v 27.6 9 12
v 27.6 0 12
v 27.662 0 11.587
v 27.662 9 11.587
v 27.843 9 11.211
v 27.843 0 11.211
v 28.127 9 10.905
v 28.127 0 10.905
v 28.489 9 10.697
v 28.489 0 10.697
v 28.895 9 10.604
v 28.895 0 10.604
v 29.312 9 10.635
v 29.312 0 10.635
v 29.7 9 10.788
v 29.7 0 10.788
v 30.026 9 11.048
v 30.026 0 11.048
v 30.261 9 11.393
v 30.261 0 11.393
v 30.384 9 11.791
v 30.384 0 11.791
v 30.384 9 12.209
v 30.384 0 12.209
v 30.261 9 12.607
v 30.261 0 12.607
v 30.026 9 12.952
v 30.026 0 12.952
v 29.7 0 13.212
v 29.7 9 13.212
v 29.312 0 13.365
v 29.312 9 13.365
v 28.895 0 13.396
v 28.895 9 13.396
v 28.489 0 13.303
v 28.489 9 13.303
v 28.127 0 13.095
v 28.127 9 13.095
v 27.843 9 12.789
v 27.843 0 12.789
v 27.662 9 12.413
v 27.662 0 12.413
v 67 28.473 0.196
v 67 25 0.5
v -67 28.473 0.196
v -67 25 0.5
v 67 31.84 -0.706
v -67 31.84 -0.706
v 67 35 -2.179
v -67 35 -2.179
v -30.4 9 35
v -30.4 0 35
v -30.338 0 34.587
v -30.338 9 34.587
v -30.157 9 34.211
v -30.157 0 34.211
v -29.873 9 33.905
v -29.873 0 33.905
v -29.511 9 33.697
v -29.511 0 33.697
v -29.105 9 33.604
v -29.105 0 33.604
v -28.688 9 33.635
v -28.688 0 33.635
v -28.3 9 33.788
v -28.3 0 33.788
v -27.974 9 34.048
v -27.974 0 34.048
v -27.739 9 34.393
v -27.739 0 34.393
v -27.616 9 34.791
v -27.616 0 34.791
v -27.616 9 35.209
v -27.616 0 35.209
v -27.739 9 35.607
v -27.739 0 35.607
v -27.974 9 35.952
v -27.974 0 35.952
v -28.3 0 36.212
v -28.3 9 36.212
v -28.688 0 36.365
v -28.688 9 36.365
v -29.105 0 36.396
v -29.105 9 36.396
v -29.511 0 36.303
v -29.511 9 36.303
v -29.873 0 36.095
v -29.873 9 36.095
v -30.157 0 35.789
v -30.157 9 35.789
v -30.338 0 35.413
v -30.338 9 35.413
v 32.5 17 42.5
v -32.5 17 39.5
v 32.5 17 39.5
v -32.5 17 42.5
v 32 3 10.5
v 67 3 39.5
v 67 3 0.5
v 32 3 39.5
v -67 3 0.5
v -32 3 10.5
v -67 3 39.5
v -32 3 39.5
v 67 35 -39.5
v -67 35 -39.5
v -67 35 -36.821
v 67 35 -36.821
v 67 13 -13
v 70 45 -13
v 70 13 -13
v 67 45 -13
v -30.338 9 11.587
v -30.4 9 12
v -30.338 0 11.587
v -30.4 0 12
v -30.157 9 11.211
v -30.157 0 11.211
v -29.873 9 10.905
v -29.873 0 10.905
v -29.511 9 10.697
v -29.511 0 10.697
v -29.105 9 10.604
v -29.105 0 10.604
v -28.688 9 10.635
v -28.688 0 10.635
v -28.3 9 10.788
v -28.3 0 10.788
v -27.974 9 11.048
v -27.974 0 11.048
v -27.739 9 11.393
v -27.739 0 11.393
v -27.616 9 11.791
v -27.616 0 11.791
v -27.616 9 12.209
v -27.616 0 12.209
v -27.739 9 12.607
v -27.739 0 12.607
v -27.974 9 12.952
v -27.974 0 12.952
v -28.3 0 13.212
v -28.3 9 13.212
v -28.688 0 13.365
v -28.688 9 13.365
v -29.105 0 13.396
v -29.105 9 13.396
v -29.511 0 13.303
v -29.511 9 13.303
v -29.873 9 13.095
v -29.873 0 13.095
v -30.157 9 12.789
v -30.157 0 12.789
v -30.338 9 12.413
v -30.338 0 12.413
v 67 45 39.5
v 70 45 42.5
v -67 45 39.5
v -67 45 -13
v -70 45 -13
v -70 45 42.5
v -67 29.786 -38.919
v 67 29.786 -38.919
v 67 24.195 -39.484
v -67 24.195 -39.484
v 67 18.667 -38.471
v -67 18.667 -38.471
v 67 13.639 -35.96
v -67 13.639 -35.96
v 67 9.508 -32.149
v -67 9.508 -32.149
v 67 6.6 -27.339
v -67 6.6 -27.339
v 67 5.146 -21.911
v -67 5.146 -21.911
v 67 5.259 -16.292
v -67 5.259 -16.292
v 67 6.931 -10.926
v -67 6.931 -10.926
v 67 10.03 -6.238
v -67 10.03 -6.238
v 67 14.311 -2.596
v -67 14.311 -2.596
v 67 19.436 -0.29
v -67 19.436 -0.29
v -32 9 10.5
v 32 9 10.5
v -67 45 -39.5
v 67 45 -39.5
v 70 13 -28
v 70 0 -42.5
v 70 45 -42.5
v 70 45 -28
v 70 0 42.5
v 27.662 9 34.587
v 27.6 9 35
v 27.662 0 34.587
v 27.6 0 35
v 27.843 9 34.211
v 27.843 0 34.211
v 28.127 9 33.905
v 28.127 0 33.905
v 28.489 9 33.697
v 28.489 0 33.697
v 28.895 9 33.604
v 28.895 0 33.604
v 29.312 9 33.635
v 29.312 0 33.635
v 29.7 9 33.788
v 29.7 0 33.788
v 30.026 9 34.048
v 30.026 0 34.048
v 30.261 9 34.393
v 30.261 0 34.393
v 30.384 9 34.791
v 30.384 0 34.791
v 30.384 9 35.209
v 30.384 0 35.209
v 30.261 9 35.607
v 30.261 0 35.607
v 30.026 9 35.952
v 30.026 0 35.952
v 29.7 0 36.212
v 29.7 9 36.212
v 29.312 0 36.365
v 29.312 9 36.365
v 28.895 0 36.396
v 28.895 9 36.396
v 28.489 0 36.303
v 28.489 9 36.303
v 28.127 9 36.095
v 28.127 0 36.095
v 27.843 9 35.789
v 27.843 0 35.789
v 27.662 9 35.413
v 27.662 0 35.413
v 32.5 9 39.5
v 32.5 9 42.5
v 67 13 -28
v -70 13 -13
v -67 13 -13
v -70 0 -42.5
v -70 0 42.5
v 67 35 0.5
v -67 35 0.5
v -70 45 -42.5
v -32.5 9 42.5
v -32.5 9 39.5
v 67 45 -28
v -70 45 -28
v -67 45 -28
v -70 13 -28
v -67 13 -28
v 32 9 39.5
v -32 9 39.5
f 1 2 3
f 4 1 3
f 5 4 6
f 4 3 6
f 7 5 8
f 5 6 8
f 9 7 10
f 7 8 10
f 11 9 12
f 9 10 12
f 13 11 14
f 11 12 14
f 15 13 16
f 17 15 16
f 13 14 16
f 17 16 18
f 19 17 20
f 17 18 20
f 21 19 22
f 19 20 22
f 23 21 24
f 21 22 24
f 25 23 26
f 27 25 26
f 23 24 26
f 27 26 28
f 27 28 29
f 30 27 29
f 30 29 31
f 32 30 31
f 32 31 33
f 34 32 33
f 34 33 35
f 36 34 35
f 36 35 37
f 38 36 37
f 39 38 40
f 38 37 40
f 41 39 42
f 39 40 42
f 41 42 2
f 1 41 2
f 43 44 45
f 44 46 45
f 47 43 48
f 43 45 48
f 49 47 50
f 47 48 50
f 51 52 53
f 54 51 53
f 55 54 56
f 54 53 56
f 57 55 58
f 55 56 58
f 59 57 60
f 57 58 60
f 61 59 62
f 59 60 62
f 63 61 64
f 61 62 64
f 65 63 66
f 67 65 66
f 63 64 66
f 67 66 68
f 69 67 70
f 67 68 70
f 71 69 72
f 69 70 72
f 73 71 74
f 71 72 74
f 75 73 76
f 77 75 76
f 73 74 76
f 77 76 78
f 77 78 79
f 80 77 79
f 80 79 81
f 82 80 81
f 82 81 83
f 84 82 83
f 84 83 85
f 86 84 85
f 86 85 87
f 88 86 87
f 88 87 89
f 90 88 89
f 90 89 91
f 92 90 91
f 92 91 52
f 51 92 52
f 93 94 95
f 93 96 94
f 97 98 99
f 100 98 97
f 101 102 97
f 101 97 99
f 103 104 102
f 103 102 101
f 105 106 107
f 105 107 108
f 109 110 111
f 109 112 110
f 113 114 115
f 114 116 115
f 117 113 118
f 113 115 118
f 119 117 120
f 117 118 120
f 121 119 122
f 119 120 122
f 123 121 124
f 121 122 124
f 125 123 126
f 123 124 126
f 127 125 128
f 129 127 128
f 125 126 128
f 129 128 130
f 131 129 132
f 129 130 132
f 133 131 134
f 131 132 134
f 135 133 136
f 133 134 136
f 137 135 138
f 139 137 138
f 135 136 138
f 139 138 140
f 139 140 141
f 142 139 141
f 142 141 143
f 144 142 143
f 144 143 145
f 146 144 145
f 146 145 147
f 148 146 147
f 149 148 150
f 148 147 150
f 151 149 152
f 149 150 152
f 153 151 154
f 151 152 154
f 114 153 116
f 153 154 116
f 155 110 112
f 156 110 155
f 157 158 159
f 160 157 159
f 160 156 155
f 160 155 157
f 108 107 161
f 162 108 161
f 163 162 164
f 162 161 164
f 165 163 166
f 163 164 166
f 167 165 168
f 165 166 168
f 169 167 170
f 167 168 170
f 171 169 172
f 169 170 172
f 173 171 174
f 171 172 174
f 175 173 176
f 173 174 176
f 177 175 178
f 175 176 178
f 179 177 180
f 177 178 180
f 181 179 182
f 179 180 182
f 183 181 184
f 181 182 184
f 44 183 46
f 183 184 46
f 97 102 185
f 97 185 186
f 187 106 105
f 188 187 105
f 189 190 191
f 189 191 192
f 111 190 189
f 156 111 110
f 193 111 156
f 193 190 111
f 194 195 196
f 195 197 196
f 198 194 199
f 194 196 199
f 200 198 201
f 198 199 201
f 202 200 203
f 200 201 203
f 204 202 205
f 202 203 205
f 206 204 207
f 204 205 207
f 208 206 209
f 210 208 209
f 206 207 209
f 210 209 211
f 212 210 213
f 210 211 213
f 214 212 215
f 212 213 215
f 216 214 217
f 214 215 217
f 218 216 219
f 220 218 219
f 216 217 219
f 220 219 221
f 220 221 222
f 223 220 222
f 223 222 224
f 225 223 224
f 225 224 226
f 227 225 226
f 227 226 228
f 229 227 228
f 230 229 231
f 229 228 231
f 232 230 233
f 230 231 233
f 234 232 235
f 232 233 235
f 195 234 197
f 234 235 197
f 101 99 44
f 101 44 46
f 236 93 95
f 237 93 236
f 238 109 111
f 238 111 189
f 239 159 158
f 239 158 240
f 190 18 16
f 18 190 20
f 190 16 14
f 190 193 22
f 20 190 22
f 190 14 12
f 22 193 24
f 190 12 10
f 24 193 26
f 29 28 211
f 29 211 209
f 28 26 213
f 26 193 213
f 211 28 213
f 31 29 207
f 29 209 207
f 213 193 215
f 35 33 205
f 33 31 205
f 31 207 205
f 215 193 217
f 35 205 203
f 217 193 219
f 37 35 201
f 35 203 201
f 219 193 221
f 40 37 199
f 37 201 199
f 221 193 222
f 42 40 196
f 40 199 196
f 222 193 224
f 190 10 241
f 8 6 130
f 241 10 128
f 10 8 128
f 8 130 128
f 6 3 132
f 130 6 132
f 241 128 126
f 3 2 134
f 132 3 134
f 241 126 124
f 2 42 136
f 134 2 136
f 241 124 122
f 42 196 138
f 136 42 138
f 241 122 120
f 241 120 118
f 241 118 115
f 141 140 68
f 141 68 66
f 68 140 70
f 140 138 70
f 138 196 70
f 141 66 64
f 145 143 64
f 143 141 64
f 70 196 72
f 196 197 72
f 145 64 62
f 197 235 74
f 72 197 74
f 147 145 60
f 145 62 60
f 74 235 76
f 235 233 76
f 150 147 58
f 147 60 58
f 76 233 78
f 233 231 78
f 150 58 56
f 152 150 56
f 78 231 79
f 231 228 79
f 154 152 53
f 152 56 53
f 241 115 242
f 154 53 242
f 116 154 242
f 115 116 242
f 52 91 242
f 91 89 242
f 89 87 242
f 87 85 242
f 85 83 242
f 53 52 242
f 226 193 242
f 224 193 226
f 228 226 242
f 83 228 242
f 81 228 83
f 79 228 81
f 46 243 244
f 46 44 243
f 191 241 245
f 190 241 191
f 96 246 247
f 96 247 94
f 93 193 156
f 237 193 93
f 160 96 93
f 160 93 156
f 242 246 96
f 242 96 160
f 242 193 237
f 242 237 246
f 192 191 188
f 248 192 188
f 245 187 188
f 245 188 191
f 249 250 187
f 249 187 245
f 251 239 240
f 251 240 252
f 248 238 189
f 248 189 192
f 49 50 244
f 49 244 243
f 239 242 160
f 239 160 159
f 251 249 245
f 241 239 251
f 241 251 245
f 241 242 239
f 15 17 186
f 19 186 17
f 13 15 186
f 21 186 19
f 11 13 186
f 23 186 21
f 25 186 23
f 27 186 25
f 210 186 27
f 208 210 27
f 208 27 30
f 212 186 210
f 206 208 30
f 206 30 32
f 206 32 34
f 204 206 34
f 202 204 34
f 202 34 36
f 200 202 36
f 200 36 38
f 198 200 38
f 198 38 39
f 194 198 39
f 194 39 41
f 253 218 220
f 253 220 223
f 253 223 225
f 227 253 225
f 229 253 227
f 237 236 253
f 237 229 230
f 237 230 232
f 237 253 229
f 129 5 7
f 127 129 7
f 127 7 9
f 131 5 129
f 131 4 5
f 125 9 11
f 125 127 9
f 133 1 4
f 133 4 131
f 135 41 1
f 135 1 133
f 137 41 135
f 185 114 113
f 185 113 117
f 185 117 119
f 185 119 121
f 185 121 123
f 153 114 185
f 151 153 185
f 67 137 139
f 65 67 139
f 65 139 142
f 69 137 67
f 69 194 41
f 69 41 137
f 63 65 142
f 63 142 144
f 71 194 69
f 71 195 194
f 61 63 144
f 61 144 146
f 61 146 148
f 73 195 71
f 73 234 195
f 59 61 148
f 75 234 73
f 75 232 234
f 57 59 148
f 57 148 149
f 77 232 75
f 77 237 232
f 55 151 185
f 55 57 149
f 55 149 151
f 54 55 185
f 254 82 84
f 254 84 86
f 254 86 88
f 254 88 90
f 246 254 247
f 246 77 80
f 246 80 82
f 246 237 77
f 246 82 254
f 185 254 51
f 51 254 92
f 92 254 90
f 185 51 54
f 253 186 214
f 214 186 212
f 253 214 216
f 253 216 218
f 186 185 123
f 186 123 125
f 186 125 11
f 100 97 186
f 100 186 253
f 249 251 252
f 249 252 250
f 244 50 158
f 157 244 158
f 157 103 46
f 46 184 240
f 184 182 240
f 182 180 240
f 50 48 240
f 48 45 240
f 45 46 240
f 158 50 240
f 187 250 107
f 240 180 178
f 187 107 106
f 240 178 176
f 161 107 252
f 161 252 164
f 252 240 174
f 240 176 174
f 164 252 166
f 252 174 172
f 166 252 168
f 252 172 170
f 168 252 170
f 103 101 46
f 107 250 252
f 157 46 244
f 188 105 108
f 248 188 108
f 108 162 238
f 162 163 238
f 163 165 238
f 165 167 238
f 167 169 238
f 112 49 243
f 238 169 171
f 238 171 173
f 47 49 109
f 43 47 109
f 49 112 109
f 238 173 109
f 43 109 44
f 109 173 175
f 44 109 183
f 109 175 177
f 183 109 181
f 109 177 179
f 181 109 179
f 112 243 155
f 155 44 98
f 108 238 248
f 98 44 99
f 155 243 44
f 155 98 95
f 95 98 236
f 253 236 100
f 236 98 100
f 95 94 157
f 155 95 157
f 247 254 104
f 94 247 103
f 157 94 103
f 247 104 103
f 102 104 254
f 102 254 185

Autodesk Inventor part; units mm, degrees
ref_plane "YZ Plane" through (0, 0, 0) normal (1, 0, 0) x (0, 1, 0)
ref_plane "XZ Plane" through (0, 0, 0) normal (0, 1, 0) x (-1, 0, 0)
ref_plane "XY Plane" through (0, 0, 0) normal (0, 0, 1) x (1, 0, 0)
sketch "Sketch1" plane through (0, 0, 0) normal (0, 1, 0) x (-1, 0, 0)
  line L0 (70, -42.5) -> (-70, -42.5)
  line L1 (-70, -42.5) -> (-70, 42.5)
  line L2 (-70, 42.5) -> (70, 42.5)
  line L3 (70, 42.5) -> (70, -42.5)
  line L4 (70, -42.5) -> (-70, 42.5) construction
  line L5 (-70, -42.5) -> (70, 42.5) construction
  point P0 (0, 0)
  dimension "d0" = 140
  dimension "d1" = 85
extrude "Outer-Shell" add sketch "Sketch1" along normal blind 45
shell "Shell1" thickness 3 removed faces 1 at (-23.3333, 45, -14.1667)
sketch "Sketch2" plane through (-67, 3, 39.5) normal (0, 1, 0) x (1, 0, 0)
  line L0 (0, 79) -> (134, 79)
  line L1 (134, 79) -> (134, 39)
  line L2 (134, 39) -> (0, 39)
  line L3 (0, 39) -> (0, 79)
  line L4 (0, 79) -> (134, 39) construction
  line L5 (134, 79) -> (0, 39) construction
  line L6 (134, 0) -> (134, 79) projected
  line L7 (0, 79) -> (134, 79) projected
  line L8 (134, 79) -> (0, 79) projected
  line L9 (0, 79) -> (0, 0) projected
  point P0 (67, 39.5)
  point P1 (67, 59)
  dimension "d5" = 40
extrude "Battery_Holder" add sketch "Sketch2" along normal blind 32
sketch "Sketch3" plane through (-67, 3, -39.5) normal (1, 0, 0) x (0, 0, -1)
  circle A0 centre (-20, 22) radius 20
  line L0 (-79, 42) -> (0, 42) projected
  line L1 (0, 0) -> (0, 42) projected
  point P0 (-39.5, -3)
  dimension "d8" = 40
  dimension "d9" = 20
extrude "Battery_Cutout" cut sketch "Sketch3" along normal up to surface (134 mm away) contours A0
sketch "Sketch4" plane through (-70, 0, -42.5) normal (-1, 0, 0) x (0, 0, 1)
  line L0 (14.5, 45) -> (29.5, 45)
  line L1 (29.5, 45) -> (29.5, 13)
  line L2 (29.5, 13) -> (14.5, 13)
  line L3 (14.5, 13) -> (14.5, 45)
  line L4 (0, 0) -> (0, 45) projected
  line L5 (0, 45) -> (85, 45) projected
  point P0 (42.5, 0)
  dimension "d15" = 15
  dimension "d16" = 32
  dimension "d17" = 14.5
extrude "Voltmeter_Cutouts" cut sketch "Sketch4" along normal through all both and the other way through all
sketch "Sketch5" plane through (0, 0, 0) normal (0, 1, 0) x (-1, 0, 0)
  line L0 (32, 10.5) -> (-32, 10.5)
  line L1 (-32, 10.5) -> (-32, 40.5)
  line L2 (-32, 40.5) -> (32, 40.5)
  line L3 (32, 40.5) -> (32, 10.5)
  line L4 (70, -13) -> (70, 42.5) projected
  line L5 (32, 40.5) -> (-32, 40.5)
  line L6 (-32, 40.5) -> (-32, 10.5)
  line L7 (-32, 10.5) -> (32, 10.5)
  line L8 (32, 10.5) -> (32, 40.5)
  line L9 (32, 40.5) -> (-32, 10.5) construction
  line L10 (-32, 40.5) -> (32, 10.5) construction
  point P0 (0, 0)
  point P1 (0, 25.5)
  point P2 (0, 25.5)
  dimension "d21" = 10.5
  dimension "d22" = 30
  dimension "d23" = 64
extrude "Controller_Stand" add sketch "Sketch5" along normal blind 9
sketch "Sketch6" plane through (-70, 0, 42.5) normal (0, 0, 1) x (1, 0, 0)
  line L0 (37.5, 17) -> (102.5, 17)
  line L1 (102.5, 17) -> (102.5, 9)
  line L2 (102.5, 9) -> (37.5, 9)
  line L3 (37.5, 9) -> (37.5, 17)
  line L4 (37.5, 17) -> (102.5, 9) construction
  line L5 (102.5, 17) -> (37.5, 9) construction
  line L6 (0, 0) -> (140, 0) projected
  point P0 (70, 0)
  point P1 (70, 13)
  dimension "d28" = 65
  dimension "d29" = 8
  dimension "d30" = 9
extrude "USB_Access" cut sketch "Sketch6" against normal up to next
sketch "Sketch7" plane through (0, 0, 0) normal (0, 1, 0) x (-1, 0, 0)
  line L0 (29, 12) -> (-29, 12) construction
  line L1 (-29, 12) -> (-29, 35) construction
  line L2 (-29, 35) -> (29, 35) construction
  line L3 (29, 35) -> (29, 12) construction
  line L4 (29, 12) -> (-29, 35) construction
  line L5 (-29, 12) -> (29, 35) construction
  circle A0 centre (29, 12) radius 1.4
  circle A1 centre (-29, 12) radius 1.4
  circle A2 centre (-29, 35) radius 1.4
  circle A3 centre (29, 35) radius 1.4
  point P0 (0, 0)
  point P1 (0, 23.5)
  point P2 (0, 23.5)
  dimension "d33" = 23
  dimension "d34" = 58
  dimension "d35" = 12
  dimension "d36" = 2.8
extrude "M3_Mount_Holes" cut sketch "Sketch7" along normal through all both and the other way through all
equation "\"d1\" = 0.607143 * d0"
equation "\"d2\" = 0.321429 * d0"
equation "\"d4\" = 0.0214286 * d0"
equation "\"d5\" = 0.285714 * d0"
equation "\"d6\" = 0.8 * d5"
equation "\"d8\" = d5"
equation "\"d9\" = 0.142857 * d0"
equation "\"d10\" = d5"
equation "\"d15\" = 0.107143 * d0"
equation "\"d16\" = 0.228571 * d0"
equation "\"d17\" = 0.103571 * d0"
equation "\"d21\" = 0.075 * d0"
equation "\"d22\" = 0.214286 * d0"
equation "\"d23\" = 2.13333 * d22"
equation "\"d24\" = 0.3 * d22"
equation "\"d28\" = 2.16667 * d22"
equation "\"d29\" = 0.266667 * d22"
equation "\"d30\" = 0.3 * d22"
equation "\"d31\" = 0.3 * d22"
equation "\"d33\" = 0.164286 * d0"
equation "\"d34\" = 0.414286 * d0"
equation "\"d35\" = 0.0857143 * d0"
equation "\"d36\" = 0.02 * d0"
properties part number "Bottom-Shell" material "ABS Plastic"
